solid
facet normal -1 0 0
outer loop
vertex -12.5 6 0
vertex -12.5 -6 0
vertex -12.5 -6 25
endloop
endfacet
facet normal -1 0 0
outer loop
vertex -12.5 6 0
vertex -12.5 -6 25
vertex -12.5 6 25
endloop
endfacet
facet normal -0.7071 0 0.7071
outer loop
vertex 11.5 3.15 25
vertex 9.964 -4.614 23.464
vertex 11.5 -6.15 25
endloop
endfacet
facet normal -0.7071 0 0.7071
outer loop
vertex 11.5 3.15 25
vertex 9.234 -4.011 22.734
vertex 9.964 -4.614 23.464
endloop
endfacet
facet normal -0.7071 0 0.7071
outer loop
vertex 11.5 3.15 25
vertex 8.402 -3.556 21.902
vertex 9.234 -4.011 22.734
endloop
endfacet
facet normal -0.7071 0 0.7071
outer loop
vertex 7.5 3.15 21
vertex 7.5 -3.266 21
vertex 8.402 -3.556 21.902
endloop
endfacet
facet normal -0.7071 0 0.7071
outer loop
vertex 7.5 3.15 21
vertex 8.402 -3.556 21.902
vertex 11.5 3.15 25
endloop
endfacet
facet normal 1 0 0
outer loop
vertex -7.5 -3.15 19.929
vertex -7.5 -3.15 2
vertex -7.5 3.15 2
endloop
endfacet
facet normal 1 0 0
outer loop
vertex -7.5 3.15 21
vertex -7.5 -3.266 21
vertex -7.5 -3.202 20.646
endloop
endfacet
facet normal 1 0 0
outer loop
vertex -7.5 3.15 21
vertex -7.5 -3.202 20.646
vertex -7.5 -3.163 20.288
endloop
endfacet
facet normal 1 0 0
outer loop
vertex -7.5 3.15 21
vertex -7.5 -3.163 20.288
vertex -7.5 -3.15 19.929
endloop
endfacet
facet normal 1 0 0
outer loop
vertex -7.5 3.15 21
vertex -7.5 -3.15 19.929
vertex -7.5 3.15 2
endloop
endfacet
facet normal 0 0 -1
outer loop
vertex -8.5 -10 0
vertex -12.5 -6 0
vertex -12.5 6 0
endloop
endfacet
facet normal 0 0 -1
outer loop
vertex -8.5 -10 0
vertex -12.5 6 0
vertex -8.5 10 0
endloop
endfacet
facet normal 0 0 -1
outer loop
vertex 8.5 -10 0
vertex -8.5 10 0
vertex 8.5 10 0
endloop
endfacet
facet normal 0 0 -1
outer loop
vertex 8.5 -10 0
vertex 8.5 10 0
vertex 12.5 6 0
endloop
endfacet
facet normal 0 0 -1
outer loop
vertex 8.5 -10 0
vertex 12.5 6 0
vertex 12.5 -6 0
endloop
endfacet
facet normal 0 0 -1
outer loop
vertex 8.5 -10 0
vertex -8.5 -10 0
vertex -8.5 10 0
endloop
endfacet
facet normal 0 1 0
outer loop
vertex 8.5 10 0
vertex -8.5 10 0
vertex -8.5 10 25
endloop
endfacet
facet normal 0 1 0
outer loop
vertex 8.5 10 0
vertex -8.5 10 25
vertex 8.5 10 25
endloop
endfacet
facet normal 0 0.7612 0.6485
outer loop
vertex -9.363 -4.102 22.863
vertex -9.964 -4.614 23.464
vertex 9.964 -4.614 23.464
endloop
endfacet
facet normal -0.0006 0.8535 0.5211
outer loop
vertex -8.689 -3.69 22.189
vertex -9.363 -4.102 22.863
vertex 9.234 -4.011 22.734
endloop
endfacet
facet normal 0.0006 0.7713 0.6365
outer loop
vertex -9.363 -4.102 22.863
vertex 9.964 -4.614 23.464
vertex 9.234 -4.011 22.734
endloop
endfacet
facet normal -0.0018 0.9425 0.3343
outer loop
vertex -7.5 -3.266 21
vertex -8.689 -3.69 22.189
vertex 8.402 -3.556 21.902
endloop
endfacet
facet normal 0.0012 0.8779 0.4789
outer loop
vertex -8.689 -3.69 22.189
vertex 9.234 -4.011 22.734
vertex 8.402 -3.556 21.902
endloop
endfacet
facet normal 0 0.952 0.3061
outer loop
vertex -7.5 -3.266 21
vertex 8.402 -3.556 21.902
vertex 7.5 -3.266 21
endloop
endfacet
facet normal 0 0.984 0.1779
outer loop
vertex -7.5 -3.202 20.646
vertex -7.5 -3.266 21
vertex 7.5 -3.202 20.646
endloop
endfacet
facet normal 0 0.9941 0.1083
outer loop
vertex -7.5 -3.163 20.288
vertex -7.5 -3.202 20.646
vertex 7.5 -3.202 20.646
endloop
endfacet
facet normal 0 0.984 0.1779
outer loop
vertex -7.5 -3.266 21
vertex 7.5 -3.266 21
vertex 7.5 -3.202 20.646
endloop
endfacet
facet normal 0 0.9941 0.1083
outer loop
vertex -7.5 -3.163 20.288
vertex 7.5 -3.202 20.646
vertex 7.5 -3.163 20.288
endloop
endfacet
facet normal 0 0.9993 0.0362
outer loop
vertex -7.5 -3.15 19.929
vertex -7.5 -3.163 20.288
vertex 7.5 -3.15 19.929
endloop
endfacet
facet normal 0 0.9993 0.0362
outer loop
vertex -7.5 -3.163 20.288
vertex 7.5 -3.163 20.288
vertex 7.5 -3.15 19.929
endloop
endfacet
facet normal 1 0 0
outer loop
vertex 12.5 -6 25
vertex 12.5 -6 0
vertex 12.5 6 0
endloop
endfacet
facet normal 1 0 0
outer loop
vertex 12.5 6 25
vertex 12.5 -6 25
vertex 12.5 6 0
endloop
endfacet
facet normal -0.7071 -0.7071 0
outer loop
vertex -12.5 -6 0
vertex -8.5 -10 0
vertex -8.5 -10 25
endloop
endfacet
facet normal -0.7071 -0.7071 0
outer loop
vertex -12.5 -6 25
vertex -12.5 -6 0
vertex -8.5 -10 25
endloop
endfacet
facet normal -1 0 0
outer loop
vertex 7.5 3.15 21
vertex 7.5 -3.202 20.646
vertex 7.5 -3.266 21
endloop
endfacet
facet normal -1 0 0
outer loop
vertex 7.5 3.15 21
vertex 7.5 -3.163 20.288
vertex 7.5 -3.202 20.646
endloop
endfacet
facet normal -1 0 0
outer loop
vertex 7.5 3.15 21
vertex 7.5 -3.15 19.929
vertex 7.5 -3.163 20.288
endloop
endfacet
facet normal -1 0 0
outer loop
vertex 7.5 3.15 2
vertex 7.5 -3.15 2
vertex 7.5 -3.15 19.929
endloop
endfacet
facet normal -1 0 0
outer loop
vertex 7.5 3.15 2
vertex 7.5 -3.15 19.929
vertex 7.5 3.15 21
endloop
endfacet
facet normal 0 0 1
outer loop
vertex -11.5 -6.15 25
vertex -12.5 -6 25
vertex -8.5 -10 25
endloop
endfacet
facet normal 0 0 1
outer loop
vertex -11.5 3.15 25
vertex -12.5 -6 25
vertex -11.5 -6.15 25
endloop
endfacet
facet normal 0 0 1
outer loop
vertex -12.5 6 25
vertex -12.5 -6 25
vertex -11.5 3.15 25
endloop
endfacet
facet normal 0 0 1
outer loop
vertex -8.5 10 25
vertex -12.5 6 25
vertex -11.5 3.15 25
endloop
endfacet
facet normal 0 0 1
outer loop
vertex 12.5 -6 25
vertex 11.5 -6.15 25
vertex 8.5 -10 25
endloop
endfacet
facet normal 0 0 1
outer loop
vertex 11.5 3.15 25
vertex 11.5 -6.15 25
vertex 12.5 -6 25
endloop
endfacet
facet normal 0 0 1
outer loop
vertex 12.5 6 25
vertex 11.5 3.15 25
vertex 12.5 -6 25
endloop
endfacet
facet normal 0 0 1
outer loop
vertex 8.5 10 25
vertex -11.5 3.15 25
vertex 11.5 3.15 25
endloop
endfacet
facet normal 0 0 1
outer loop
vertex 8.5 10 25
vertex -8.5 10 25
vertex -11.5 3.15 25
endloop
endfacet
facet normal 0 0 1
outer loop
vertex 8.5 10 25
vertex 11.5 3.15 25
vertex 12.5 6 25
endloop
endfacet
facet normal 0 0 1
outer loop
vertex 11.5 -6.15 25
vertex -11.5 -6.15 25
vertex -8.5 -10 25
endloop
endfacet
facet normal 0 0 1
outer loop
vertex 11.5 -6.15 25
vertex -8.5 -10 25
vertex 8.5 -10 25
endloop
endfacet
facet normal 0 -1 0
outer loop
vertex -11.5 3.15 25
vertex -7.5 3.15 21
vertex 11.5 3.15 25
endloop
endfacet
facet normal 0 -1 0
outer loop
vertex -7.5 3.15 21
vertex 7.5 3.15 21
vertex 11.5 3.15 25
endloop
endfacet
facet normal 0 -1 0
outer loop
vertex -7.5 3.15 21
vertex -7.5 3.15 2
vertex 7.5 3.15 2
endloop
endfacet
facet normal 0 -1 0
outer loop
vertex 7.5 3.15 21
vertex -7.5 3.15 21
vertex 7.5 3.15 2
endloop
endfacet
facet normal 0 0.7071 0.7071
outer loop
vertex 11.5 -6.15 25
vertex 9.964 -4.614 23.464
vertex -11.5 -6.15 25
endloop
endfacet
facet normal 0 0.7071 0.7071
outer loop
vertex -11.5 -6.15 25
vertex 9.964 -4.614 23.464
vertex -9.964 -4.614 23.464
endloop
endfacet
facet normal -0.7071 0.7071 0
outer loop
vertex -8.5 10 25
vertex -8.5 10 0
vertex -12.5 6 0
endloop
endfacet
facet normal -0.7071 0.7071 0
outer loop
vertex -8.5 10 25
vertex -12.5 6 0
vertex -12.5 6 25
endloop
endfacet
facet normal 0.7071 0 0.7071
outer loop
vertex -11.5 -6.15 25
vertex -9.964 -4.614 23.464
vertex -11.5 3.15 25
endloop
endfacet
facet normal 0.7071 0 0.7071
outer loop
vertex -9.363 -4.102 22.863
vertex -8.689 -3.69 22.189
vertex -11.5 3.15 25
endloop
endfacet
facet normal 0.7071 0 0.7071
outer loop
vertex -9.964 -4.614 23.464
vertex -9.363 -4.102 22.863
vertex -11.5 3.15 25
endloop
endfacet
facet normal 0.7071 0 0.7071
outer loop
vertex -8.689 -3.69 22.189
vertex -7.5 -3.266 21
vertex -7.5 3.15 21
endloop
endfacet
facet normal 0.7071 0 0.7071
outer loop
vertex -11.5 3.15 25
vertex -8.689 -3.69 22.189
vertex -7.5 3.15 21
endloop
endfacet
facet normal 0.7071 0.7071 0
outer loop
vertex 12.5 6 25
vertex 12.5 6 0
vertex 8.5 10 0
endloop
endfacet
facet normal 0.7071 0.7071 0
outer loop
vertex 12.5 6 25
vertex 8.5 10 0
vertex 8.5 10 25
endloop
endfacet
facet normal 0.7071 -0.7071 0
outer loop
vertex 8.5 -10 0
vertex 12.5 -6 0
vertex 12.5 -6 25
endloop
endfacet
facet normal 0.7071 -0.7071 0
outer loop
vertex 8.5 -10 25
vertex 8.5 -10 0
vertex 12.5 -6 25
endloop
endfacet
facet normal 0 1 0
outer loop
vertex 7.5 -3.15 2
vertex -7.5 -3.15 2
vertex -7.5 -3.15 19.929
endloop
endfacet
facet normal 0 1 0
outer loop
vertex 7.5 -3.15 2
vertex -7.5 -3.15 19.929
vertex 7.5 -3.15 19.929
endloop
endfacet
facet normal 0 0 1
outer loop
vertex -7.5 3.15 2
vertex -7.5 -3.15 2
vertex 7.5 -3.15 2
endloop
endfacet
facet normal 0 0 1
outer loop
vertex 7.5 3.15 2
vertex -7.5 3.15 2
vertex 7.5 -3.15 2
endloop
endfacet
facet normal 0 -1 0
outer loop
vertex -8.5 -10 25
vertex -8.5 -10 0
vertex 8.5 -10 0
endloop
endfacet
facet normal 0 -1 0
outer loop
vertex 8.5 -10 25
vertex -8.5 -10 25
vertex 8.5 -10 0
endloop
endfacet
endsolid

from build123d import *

# Parameters (mm, degrees)
F0_W         = 25
F0_H         = 20
F0_W_2       = 15
F0_H_2       = 6.3
F1_DEPTH     = 25
F2_W         = 15
F2_H         = 6.3
F3_DEPTH     = 2
F4_SIZE      = 4
F5_SIZE      = 3
F6_T1_DEPTH  = 15
F6_T6_DEPTH  = 6.1776695297
F6_T11_DEPTH = 6.1776695297


# Not quite as in the source:
# - a fillet or chamfer that OpenCascade refuses, or shapes differently, is made with other operations: its cross-section is extruded or revolved along the edge and cut away or added


with BuildPart() as f1:
    # F0 (on Top) → F1 (new body)
    with BuildSketch(Plane.XY):
        Rectangle(F0_W, F0_H)
        Rectangle(F0_W_2, F0_H_2, mode=Mode.SUBTRACT)
    extrude(amount=F1_DEPTH)

    # F2 (on face) → F3 (join)
    with BuildSketch(Plane(origin=(0, 0, 0), x_dir=(1, 0, 0), z_dir=(0, 0, -1))):
        Rectangle(F2_W, F2_H)
    extrude(amount=-F3_DEPTH)

    # F4
    f4_edges = [f1.edges().sort_by_distance(p)[0] for p in [
        (-7.5, 0, 25),
        (7.5, 0, 25),
        (-12.5, -10, 12.5),
        (12.5, -10, 12.5),
        (12.5, 10, 12.5),
        (-12.5, 10, 12.5),
    ]]
    chamfer(f4_edges, length=F4_SIZE)

    # F5
    f5_edges = [f1.edges().sort_by_distance(p)[0] for p in [
        (0, -3.15, 25),
    ]]
    chamfer(f5_edges, length=F5_SIZE)

    # F6: fillet of radius 5 on 1 edges, made by hand

    # F6_s2 → F6_t1 (cut)
    with BuildSketch(Plane.YZ.offset(-7.5)):
        with BuildLine():
            ThreePointArc((-4.6144660941, 23.4644660941), (-3.5306023374, 21.84234935), (-3.15, 19.9289321881))
            Line((-3.15, 19.9289321881), (-3.15, 22))
            Line((-3.15, 22), (-4.6144660941, 23.4644660941))
        make_face()
    extrude(amount=F6_T1_DEPTH, mode=Mode.SUBTRACT)


with BuildPart() as f6_tool4:
    # F6_s5 → F6_t6 (new body)
    with BuildSketch(Plane.YZ.offset(13.6776695297)):
        with BuildLine():
            ThreePointArc((-4.6144660941, 23.4644660941), (-3.5306023374, 21.84234935), (-3.15, 19.9289321881))
            Line((-3.15, 19.9289321881), (-3.15, 22))
            Line((-3.15, 22), (-4.6144660941, 23.4644660941))
        make_face()
    extrude(amount=-F6_T6_DEPTH)

    split(bisect_by=Plane(origin=(-6.75, 0, 6.75), x_dir=(0, 1, 0), z_dir=(-0.7071067812, 0, 0.7071067812)), keep=Keep.TOP)


with BuildPart() as f1_1:
    add(f1.part)

    # F6_t3: cut F6_tool4
    add(f6_tool4.part, mode=Mode.SUBTRACT)


with BuildPart() as f6_tool9:
    # F6_s10 → F6_t11 (new body)
    with BuildSketch(Plane.YZ.offset(-7.5)):
        with BuildLine():
            ThreePointArc((-4.6144660941, 23.4644660941), (-3.5306023374, 21.84234935), (-3.15, 19.9289321881))
            Line((-3.15, 19.9289321881), (-3.15, 22))
            Line((-3.15, 22), (-4.6144660941, 23.4644660941))
        make_face()
    extrude(amount=-F6_T11_DEPTH)

    split(bisect_by=Plane(origin=(6.75, 0, 6.75), x_dir=(0, 1, 0), z_dir=(0.7071067812, 0, 0.7071067812)), keep=Keep.TOP)


with BuildPart() as f1_2:
    add(f1_1.part)

    # F6_t8: cut F6_tool9
    add(f6_tool9.part, mode=Mode.SUBTRACT)


solid = f1_2.part
